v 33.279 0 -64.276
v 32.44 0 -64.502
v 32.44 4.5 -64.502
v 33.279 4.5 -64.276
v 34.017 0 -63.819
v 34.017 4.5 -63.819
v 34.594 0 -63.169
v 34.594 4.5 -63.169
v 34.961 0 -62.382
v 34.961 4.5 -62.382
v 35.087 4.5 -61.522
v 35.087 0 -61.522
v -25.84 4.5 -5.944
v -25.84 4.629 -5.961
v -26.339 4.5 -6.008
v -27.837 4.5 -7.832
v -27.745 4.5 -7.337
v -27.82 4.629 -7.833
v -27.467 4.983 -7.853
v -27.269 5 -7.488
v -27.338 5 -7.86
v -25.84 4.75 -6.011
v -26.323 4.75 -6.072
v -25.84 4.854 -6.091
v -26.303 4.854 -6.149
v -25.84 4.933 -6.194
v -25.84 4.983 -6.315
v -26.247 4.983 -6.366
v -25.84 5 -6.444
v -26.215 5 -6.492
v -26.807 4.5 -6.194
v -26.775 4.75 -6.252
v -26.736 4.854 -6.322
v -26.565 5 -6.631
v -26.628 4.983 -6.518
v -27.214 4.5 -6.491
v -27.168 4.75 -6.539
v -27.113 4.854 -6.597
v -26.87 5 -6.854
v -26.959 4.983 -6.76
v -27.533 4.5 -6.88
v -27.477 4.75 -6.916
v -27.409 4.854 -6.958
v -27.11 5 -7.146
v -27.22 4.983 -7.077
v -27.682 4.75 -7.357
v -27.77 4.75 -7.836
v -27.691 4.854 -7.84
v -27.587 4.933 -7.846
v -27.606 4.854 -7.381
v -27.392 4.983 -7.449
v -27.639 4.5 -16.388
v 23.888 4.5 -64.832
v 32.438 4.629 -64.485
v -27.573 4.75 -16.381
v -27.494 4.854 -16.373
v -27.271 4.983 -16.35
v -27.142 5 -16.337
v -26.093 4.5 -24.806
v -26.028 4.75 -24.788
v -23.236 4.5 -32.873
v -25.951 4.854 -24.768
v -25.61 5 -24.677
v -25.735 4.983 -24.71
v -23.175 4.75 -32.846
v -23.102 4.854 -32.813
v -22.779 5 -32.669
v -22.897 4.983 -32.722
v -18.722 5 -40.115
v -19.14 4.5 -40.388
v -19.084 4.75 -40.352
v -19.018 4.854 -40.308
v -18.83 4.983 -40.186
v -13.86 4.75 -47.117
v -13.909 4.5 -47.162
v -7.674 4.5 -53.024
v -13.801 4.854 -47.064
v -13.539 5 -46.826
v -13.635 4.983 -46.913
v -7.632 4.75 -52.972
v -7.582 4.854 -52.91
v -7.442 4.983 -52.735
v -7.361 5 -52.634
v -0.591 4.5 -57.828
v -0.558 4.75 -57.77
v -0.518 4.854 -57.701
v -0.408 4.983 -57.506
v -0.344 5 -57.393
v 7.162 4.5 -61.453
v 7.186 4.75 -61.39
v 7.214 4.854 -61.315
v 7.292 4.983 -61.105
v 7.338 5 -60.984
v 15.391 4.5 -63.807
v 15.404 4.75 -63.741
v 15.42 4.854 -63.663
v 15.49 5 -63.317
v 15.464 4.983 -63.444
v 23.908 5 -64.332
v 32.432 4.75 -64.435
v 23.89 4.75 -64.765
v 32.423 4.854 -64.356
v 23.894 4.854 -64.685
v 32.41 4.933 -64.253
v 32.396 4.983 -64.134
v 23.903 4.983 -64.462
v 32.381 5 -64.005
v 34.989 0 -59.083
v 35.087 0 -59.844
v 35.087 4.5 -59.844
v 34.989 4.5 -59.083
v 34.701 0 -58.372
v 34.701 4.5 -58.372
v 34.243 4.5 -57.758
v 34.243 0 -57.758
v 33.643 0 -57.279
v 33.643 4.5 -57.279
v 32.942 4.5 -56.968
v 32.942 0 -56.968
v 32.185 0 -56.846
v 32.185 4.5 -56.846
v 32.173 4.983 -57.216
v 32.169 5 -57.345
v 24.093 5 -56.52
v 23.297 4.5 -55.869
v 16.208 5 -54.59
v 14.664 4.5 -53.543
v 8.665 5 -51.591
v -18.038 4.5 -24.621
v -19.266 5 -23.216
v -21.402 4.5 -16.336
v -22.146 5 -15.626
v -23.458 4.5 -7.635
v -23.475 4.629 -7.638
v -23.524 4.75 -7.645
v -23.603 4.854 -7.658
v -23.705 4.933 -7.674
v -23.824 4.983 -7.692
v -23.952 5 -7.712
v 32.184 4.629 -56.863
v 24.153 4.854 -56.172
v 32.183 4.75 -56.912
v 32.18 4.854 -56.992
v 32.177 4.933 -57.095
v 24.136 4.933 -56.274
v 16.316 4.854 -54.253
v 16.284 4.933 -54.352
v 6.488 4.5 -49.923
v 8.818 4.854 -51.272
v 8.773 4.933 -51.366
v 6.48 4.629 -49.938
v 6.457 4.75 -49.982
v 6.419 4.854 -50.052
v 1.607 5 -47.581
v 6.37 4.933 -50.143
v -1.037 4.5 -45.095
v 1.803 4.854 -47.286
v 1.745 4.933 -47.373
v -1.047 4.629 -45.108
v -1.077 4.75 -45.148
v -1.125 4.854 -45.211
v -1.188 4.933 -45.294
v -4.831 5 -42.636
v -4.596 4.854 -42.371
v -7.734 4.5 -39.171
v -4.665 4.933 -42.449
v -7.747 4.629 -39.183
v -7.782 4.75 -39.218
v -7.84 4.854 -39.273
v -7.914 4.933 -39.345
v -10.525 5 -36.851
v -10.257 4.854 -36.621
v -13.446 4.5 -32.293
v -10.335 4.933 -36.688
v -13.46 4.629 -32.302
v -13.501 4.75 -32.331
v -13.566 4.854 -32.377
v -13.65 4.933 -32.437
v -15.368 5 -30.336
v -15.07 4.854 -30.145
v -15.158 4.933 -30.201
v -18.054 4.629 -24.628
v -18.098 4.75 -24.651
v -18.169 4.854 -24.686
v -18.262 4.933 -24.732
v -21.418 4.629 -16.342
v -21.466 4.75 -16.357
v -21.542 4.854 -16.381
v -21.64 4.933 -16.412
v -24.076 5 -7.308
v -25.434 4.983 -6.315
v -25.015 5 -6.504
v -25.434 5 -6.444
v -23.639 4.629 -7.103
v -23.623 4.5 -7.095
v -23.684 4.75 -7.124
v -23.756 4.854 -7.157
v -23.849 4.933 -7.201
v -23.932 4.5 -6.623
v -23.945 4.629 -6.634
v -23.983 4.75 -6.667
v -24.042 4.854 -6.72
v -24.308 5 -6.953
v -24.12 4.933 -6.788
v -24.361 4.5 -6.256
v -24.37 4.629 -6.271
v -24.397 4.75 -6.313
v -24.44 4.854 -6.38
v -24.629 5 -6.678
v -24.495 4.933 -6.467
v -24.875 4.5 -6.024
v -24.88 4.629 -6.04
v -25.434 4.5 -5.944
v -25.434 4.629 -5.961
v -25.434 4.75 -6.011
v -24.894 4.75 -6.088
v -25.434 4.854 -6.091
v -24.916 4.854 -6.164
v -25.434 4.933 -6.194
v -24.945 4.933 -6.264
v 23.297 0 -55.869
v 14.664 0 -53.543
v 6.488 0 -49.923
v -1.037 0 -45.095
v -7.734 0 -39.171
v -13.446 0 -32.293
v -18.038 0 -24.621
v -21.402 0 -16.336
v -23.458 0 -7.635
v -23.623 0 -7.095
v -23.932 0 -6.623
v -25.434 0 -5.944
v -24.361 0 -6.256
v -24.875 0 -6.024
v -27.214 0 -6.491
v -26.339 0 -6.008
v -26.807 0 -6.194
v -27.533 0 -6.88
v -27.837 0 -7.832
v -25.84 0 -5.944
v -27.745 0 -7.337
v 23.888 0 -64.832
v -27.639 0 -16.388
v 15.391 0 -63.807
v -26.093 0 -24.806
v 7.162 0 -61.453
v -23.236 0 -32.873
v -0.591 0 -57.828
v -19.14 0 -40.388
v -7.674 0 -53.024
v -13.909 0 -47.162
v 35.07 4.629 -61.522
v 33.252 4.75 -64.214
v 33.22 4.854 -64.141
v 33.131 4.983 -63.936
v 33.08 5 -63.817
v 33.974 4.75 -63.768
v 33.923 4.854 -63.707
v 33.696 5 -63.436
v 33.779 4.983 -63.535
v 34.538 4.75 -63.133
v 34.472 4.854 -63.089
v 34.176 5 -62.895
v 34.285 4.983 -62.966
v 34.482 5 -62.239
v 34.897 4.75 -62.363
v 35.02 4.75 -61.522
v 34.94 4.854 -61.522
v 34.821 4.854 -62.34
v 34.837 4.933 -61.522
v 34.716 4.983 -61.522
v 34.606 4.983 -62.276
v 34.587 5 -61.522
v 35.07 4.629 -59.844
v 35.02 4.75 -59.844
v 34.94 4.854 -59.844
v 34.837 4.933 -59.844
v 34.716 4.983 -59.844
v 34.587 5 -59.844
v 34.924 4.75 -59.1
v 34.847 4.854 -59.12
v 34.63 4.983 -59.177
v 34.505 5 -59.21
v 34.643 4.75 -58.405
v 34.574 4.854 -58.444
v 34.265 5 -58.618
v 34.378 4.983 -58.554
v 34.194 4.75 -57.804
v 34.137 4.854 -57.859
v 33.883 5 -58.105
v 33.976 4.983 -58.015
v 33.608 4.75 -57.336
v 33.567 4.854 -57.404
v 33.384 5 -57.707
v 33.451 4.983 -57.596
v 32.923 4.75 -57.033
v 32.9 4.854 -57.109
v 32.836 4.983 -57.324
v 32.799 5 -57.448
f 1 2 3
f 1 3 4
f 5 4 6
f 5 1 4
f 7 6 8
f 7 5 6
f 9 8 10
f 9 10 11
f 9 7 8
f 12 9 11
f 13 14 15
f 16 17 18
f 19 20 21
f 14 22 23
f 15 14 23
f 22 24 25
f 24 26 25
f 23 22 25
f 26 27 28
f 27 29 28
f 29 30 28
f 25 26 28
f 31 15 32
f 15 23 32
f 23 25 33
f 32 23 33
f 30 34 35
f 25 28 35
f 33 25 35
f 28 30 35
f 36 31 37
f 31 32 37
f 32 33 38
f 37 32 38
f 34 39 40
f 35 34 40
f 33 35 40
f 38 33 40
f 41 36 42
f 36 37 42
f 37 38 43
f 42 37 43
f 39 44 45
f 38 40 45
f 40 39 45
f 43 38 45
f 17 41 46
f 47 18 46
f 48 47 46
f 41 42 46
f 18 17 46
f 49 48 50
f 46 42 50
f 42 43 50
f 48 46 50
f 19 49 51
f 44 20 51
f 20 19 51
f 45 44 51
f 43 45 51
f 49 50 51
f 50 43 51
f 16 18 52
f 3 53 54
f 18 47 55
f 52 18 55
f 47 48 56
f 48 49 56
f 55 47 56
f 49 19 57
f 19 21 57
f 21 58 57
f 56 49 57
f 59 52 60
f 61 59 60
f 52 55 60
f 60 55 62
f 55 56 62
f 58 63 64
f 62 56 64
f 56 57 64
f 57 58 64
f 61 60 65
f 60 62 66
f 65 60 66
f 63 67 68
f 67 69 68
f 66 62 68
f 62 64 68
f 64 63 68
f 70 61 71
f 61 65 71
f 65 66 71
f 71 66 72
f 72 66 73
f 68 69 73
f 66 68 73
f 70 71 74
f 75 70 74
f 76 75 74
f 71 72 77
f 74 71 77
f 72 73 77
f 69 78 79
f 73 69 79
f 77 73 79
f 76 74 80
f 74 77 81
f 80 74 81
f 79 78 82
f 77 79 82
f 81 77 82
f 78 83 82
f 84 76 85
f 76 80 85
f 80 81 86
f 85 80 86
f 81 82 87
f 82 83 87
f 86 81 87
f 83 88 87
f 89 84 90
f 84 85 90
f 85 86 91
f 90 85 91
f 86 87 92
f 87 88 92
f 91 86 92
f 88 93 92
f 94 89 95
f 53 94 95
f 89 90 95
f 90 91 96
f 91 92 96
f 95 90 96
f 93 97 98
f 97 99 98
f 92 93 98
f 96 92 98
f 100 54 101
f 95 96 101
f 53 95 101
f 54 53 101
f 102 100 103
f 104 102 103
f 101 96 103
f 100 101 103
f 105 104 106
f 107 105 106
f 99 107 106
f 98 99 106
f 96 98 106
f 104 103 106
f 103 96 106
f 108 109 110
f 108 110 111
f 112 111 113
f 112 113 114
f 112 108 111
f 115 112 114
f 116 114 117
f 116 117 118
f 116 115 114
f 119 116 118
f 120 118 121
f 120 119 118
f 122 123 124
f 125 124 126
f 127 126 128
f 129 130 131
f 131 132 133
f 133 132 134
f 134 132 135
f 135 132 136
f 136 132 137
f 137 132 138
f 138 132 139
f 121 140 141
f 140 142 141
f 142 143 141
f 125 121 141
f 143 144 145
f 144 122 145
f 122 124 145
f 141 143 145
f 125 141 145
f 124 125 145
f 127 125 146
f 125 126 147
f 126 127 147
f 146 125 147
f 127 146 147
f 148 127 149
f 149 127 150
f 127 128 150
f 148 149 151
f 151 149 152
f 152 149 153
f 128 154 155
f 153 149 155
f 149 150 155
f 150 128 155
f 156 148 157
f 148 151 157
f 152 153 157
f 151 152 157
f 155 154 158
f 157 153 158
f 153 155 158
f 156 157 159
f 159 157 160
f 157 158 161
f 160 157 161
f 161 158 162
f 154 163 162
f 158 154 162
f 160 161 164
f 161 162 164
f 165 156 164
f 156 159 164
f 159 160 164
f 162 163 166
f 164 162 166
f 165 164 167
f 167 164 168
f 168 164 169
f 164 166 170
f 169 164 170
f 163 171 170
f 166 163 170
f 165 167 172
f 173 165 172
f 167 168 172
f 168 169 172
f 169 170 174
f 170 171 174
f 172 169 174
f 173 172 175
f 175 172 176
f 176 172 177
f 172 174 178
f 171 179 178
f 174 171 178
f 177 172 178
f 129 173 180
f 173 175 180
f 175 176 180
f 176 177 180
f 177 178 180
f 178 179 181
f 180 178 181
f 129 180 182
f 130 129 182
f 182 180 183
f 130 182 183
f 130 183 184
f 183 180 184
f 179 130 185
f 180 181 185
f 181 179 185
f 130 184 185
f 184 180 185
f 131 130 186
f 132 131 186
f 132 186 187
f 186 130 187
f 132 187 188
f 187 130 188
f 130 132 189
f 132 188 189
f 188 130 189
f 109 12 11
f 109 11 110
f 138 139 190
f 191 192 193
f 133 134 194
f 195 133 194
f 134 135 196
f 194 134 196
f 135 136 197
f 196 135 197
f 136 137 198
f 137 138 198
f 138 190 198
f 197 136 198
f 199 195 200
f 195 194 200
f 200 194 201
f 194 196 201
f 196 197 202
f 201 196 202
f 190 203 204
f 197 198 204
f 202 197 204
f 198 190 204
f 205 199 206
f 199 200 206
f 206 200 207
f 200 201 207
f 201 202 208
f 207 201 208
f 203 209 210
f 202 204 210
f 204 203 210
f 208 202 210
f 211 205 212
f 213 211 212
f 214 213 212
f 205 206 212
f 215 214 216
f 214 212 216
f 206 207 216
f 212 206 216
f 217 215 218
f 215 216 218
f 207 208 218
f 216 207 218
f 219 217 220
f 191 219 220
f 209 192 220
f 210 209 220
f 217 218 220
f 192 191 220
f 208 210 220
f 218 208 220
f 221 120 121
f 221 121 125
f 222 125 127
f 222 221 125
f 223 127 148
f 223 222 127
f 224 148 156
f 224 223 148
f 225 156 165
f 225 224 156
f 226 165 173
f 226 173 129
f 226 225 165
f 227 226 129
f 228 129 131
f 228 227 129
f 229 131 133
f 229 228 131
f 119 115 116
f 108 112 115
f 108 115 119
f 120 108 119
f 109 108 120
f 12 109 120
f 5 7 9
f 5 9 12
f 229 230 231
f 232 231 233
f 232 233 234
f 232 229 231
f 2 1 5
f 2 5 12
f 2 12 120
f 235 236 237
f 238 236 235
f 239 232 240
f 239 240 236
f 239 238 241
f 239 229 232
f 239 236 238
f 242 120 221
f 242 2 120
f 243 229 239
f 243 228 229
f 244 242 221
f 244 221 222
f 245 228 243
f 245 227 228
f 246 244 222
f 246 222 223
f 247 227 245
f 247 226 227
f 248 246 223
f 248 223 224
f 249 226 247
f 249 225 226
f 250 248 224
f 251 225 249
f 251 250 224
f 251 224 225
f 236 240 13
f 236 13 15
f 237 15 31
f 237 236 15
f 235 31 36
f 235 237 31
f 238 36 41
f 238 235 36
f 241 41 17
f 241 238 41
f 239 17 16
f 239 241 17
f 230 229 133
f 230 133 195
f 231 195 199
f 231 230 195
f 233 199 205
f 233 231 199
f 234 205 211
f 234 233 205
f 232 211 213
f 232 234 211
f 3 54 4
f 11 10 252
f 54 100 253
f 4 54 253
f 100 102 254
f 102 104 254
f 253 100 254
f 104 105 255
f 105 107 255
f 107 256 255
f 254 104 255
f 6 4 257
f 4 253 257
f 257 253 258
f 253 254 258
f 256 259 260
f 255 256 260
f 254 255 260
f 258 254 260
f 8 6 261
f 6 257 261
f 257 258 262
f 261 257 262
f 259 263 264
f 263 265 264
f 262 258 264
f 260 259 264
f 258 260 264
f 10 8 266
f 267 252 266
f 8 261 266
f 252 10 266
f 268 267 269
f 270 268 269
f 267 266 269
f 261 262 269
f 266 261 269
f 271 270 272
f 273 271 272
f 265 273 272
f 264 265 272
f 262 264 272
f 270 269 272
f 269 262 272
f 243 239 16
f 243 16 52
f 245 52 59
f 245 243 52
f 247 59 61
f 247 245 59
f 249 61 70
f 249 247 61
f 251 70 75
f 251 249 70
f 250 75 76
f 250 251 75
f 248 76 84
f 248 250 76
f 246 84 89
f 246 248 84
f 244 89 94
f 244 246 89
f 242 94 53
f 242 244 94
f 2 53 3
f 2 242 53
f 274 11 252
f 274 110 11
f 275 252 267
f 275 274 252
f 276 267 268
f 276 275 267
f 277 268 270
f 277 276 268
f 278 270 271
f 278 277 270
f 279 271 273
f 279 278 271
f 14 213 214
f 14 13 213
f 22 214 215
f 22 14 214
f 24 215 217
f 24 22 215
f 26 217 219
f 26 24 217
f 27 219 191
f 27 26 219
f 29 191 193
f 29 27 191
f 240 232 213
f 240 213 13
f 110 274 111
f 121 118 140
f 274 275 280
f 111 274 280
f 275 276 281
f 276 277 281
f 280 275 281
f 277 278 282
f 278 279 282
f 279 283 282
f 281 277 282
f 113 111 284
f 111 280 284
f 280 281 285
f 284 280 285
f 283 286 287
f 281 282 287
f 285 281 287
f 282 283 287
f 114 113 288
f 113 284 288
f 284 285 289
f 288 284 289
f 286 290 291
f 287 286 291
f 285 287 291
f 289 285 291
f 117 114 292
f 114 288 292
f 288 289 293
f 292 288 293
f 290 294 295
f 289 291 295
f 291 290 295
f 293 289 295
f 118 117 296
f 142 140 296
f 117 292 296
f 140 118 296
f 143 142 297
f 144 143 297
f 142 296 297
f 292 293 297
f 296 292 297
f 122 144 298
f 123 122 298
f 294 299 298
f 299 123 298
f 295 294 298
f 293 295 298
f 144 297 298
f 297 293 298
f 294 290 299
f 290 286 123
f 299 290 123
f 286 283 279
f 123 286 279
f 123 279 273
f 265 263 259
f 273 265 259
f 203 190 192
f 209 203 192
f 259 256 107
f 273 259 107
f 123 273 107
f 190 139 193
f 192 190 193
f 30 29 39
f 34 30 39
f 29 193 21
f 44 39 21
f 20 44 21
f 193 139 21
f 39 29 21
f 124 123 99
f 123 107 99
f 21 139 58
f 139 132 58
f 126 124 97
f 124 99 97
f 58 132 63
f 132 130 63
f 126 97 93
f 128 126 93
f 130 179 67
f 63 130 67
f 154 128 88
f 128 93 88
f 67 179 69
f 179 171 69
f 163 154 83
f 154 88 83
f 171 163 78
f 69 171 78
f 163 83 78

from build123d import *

# Parameters (mm, degrees)
EXTRUDE_1_DEPTH = 5
FILLET_1_R      = 0.5


with BuildPart() as part:
    # Эскиз1 → Бобышка-Вытянуть1 (new body)
    with BuildSketch(Plane(origin=(0, 0, 0), x_dir=(1, 0, 0), z_dir=(0, 1, 0))):
        with BuildLine():
            Line((-25.434053198, 5.944166553), (-25.839949009, 5.944166553))
            ThreePointArc((-25.839949009, 5.944166553), (-27.213842529, 6.49075106), (-27.836787137, 7.831749958))
            ThreePointArc((-27.836787137, 7.831749958), (-10.907888473, 50.216792744), (32.43979713, 64.501666381))
            ThreePointArc((32.43979713, 64.501666381), (34.329532824, 63.515149683), (35.086918855, 61.522492515))
            Line((35.086918855, 61.522492515), (35.086918855, 59.843935519))
            ThreePointArc((35.086918855, 59.843935519), (34.242597527, 57.757539233), (32.184885879, 56.845535535))
            ThreePointArc((32.184885879, 56.845535535), (-4.499436157, 42.261590709), (-23.458092531, 7.635007302))
            ThreePointArc((-23.458092531, 7.635007302), (-24.133729873, 6.424574749), (-25.434053198, 5.944166553))
        make_face()
    extrude(amount=EXTRUDE_1_DEPTH)

    # Скругление1
    fillet_1_edges = [part.edges().sort_by_distance(p)[0] for p in [
        (34.329532824, 5, -63.515149683),
        (-10.907888473, 5, -50.216792744),
        (-27.213842529, 5, -6.49075106),
        (-25.637001104, 5, -5.944166553),
        (-24.133729873, 5, -6.424574749),
        (-4.499436157, 5, -42.261590709),
        (34.242597527, 5, -57.757539233),
        (35.086918855, 5, -60.683214017),
    ]]
    fillet(fillet_1_edges, radius=FILLET_1_R)


solid = part.part
